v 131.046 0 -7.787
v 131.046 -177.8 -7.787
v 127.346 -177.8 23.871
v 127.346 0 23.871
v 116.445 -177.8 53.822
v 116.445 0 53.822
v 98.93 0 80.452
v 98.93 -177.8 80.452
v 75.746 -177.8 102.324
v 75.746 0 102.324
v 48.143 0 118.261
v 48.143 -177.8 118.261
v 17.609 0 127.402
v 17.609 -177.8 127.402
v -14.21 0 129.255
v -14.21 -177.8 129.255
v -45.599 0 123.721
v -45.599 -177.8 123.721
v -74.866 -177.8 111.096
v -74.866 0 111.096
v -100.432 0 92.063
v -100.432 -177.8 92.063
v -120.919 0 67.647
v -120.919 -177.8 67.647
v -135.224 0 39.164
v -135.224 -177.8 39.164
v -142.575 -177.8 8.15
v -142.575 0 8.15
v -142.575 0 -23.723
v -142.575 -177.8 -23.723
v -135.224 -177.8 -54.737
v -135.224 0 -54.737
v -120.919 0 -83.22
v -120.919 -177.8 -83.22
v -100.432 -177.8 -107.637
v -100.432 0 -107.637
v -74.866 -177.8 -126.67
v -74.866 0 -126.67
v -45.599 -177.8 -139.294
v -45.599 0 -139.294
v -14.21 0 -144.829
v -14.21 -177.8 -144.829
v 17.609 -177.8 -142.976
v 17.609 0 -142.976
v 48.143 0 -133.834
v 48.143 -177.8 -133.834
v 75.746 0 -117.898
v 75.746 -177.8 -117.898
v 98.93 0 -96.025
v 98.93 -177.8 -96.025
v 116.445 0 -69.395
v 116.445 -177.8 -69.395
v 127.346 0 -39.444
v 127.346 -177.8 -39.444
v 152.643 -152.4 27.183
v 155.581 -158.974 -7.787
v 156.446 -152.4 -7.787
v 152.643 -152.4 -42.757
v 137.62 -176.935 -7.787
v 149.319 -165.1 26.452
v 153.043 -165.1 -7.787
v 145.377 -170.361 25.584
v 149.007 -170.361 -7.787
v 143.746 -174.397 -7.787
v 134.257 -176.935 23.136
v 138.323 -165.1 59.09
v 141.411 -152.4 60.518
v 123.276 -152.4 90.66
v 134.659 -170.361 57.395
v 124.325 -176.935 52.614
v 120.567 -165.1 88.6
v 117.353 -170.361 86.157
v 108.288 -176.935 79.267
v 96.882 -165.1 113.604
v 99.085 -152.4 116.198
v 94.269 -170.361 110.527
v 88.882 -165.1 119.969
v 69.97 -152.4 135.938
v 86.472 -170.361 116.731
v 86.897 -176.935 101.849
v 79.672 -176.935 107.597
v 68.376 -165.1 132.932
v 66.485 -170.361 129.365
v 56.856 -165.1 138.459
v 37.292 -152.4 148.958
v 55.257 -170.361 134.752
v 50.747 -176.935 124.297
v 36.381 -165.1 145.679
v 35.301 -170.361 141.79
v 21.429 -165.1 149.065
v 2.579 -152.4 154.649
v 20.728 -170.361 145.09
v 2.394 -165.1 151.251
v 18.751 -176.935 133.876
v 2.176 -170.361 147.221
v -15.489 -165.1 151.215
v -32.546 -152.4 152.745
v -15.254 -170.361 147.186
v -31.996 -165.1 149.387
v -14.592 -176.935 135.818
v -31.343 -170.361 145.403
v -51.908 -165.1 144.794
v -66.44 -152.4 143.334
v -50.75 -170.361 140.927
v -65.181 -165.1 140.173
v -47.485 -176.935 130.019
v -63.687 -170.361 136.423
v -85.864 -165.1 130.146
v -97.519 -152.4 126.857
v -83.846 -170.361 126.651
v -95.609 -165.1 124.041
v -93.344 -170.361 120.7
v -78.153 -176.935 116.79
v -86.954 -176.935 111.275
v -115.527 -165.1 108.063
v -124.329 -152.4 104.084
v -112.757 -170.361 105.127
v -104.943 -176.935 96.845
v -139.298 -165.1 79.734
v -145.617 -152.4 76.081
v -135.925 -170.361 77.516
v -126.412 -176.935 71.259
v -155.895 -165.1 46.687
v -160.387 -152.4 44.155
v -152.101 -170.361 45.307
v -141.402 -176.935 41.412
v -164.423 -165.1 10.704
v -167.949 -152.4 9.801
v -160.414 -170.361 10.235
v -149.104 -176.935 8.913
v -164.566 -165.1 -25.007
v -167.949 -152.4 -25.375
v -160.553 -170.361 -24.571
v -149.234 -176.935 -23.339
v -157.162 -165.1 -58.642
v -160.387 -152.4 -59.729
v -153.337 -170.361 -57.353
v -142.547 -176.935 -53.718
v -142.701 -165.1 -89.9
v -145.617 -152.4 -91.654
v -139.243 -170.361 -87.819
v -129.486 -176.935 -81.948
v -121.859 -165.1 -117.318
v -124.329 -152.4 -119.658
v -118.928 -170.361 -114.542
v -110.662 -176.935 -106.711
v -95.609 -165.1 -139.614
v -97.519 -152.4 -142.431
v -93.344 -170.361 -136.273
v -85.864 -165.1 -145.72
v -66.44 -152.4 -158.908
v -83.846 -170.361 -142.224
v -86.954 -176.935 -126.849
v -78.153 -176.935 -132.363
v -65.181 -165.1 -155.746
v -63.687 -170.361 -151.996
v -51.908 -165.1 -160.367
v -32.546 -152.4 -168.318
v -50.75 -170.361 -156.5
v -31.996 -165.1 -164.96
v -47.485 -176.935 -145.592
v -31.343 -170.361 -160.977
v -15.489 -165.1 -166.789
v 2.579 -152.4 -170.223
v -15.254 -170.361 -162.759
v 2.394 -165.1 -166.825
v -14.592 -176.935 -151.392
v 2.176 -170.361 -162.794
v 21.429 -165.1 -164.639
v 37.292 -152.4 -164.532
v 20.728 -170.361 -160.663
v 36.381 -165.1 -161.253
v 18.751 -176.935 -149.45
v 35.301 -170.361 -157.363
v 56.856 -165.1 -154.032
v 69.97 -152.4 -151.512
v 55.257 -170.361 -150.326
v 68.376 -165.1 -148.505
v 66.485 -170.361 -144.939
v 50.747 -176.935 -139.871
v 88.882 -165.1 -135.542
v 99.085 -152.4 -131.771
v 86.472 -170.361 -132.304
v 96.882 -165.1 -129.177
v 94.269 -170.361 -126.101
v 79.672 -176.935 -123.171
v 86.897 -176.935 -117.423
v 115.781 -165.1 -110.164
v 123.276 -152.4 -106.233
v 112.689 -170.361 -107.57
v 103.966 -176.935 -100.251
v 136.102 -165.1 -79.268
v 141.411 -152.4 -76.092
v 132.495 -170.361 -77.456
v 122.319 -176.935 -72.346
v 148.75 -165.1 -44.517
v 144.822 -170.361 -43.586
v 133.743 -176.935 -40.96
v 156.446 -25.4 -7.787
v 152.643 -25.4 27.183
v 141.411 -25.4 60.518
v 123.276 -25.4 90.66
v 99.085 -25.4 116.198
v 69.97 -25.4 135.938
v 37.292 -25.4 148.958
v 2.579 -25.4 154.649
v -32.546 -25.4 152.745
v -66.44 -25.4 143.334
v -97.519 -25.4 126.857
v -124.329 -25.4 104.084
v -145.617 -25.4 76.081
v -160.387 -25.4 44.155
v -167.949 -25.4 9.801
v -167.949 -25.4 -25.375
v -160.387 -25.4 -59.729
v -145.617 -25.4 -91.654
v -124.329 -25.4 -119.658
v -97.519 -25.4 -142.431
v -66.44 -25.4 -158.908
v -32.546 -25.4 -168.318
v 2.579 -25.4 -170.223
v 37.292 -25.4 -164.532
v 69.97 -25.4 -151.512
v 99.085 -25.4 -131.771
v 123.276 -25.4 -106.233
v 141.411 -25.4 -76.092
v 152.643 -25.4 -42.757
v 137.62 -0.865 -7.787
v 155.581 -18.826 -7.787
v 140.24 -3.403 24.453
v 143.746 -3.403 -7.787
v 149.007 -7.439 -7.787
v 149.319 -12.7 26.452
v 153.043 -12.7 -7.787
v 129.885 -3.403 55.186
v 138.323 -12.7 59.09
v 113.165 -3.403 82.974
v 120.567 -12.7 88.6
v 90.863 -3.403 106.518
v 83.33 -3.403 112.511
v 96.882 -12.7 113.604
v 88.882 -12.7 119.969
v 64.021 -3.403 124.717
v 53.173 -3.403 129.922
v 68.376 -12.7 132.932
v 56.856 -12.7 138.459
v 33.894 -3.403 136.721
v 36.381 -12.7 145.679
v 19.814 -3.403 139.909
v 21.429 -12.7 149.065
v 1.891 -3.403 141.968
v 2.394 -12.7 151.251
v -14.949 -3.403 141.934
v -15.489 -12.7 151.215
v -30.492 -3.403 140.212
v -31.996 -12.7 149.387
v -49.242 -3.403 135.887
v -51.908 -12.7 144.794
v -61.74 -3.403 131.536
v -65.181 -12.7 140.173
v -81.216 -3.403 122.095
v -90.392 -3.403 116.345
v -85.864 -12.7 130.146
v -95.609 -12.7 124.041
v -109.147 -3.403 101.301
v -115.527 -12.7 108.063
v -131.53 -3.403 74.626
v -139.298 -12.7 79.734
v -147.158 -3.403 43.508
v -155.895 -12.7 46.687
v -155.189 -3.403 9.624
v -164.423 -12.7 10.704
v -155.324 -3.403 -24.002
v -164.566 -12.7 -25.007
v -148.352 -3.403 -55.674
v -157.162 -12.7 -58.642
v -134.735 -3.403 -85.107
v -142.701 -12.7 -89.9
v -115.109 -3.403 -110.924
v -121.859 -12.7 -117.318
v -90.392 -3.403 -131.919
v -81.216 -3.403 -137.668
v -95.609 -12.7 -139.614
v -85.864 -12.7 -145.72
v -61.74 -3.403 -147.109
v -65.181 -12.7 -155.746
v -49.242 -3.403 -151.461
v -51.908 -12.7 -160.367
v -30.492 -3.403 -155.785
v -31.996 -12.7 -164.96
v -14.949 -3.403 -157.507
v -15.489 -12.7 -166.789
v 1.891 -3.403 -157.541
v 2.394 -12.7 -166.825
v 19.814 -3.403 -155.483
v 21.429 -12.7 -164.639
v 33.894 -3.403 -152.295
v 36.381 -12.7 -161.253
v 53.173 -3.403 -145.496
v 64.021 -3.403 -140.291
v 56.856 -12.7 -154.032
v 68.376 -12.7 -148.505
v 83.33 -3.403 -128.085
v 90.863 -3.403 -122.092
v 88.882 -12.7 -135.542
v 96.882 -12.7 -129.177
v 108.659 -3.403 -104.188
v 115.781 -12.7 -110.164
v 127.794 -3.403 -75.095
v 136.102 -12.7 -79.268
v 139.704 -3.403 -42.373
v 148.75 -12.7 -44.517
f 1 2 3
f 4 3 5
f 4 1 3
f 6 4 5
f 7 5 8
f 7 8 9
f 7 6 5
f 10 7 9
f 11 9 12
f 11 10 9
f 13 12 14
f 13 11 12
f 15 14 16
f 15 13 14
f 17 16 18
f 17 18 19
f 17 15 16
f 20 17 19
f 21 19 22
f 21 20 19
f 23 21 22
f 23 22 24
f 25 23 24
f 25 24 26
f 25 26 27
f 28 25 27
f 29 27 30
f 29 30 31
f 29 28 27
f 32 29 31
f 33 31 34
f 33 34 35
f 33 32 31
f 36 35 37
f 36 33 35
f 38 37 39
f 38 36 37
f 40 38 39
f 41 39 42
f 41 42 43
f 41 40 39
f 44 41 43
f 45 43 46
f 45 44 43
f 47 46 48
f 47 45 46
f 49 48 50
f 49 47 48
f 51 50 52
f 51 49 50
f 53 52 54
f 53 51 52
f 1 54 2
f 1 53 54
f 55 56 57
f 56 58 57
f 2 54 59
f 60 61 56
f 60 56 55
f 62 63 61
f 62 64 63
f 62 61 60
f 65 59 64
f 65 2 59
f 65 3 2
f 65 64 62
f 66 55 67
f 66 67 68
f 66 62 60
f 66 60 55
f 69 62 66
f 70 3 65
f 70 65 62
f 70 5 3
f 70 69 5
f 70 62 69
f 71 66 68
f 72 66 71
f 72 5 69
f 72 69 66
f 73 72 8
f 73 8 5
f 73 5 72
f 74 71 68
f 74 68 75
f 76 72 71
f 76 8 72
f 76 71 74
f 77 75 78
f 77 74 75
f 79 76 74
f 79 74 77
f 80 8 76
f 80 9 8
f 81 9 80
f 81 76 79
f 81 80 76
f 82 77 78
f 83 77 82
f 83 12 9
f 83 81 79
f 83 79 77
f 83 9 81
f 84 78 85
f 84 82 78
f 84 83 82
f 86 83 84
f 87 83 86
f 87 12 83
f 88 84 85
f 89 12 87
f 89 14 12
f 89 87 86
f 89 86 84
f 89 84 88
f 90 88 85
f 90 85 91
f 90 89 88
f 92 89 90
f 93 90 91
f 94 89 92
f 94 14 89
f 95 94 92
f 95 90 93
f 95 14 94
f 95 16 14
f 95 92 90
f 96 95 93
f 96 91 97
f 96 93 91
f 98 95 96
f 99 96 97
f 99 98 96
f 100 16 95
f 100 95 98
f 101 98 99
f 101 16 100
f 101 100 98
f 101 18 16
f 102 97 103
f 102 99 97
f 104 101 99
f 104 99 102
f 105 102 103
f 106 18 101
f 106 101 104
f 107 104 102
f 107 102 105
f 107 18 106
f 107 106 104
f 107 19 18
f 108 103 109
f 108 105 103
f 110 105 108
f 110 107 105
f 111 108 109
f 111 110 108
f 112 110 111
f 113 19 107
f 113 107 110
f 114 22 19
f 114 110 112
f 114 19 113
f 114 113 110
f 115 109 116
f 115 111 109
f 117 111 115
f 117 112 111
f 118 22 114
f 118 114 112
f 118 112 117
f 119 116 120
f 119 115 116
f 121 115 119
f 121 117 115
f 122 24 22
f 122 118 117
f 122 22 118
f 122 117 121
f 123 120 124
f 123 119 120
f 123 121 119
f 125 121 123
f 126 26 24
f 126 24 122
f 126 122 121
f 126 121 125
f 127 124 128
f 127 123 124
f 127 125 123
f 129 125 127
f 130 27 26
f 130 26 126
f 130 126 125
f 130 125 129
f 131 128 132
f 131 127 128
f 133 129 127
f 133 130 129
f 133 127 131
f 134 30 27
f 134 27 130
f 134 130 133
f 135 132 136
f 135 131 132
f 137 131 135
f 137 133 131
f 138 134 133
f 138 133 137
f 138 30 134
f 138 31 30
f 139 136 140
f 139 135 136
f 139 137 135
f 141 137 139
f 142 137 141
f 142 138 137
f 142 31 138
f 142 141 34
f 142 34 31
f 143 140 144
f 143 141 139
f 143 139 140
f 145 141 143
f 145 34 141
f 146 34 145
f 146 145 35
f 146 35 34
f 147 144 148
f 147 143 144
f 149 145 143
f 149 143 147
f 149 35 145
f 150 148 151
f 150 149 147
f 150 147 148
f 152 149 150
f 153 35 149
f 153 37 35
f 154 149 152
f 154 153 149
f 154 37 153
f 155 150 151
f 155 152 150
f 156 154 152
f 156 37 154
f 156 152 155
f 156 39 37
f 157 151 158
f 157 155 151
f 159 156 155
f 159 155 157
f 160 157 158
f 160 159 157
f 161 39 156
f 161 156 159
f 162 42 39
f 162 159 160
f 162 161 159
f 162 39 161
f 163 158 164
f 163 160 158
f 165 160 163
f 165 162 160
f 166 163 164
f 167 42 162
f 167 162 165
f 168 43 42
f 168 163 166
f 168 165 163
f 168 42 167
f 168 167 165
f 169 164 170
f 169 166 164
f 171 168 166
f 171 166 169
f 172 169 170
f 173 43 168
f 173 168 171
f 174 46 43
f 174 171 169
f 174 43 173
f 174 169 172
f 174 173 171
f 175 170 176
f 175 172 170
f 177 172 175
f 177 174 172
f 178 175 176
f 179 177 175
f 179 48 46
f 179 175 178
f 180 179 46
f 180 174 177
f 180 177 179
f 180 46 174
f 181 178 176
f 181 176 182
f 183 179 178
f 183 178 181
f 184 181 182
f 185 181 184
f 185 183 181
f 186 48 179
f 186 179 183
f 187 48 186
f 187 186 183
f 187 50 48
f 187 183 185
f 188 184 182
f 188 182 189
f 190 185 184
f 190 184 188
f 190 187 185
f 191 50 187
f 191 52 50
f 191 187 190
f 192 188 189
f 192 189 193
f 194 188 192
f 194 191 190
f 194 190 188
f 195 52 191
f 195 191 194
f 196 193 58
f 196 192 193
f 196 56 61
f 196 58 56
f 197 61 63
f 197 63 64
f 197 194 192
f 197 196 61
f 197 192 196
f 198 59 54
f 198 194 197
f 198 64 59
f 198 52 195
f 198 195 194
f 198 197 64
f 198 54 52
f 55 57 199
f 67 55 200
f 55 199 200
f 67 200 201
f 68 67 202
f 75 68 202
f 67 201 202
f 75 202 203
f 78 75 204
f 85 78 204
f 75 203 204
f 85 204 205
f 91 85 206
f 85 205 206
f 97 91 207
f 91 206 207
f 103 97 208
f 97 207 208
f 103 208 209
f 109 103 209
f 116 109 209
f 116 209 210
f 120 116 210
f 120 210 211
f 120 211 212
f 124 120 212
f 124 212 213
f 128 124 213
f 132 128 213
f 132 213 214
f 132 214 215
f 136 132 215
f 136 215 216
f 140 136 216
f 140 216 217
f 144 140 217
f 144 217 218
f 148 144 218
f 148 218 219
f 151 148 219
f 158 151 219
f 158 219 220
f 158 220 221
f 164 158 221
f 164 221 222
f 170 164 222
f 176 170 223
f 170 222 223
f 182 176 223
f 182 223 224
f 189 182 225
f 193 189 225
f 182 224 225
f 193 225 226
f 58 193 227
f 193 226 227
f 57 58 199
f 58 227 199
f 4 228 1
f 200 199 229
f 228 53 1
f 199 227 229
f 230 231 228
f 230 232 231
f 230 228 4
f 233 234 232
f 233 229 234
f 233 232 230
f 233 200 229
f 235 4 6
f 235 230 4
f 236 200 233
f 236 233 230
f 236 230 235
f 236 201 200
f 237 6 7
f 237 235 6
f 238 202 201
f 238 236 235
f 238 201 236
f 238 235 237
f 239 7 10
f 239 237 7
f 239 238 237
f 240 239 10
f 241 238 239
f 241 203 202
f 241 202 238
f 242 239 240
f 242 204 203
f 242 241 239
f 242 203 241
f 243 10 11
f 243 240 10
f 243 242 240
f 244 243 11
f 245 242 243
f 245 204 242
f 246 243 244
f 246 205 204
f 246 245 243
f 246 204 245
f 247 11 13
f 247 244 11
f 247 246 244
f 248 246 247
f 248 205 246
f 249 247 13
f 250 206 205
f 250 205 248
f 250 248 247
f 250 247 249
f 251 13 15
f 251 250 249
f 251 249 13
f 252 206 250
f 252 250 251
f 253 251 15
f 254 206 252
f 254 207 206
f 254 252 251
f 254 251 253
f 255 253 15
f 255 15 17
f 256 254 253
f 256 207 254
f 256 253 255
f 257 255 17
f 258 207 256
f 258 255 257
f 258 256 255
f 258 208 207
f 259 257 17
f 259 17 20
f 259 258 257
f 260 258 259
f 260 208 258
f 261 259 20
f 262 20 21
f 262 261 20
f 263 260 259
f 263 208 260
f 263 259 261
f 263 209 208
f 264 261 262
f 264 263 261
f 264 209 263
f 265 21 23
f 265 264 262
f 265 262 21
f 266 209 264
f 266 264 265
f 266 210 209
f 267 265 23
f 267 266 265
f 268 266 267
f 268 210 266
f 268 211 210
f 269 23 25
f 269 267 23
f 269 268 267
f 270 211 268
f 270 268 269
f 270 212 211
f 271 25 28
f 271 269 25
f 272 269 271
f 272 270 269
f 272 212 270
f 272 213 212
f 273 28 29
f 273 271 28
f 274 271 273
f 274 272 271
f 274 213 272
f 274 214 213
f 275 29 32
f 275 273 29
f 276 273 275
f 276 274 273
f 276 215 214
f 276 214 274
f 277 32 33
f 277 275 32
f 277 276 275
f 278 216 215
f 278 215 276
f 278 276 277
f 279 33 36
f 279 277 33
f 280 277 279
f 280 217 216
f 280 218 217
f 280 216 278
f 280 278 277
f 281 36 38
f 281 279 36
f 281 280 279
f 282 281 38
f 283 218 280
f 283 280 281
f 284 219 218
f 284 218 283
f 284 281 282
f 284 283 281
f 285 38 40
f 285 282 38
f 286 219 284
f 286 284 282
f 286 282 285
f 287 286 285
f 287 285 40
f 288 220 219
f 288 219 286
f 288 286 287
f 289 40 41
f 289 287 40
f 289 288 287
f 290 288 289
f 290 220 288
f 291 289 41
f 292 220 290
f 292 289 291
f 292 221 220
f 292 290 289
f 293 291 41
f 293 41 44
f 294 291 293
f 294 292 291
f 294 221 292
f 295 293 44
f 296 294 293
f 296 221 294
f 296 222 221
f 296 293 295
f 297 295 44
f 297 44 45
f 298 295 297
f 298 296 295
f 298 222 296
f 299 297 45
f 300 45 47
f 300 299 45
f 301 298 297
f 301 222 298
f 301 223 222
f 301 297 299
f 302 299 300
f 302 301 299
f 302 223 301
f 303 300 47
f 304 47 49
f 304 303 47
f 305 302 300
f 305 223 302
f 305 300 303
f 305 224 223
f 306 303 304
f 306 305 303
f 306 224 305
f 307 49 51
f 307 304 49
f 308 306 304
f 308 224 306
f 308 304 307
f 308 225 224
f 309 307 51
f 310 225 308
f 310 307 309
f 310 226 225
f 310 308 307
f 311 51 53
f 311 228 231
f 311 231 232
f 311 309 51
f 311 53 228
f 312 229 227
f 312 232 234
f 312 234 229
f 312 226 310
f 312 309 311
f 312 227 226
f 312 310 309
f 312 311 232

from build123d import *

# Parameters (mm, degrees)
F0_R     = 137.2744361776
F1_DEPTH = 177.8
F2_T     = 25.4


# Not quite as in the source:
# - a fillet or chamfer that OpenCascade refuses, or shapes differently, is made with other operations: its cross-section is extruded or revolved along the edge and cut away or added


with BuildPart() as f1:
    # F0 (on Front) → F1 (new body)
    with BuildSketch(Plane.XZ):
        with Locations((-6.2283538282, -7.7867358923)):
            Circle(F0_R)
    extrude(amount=F1_DEPTH)

    # F2
    f2_openings = [f1.faces().sort_by_distance(p)[0] for p in [
        (-6.228354, -177.8, -7.786736),
        (-6.228354, 0, -7.786736),
    ]]
    offset(amount=F2_T, openings=f2_openings)

    # F3: fillet of radius 25.4 on 2 edges, made by hand

    # F3_s1 → F3_t2 (revolve, cut)
    with BuildSketch(Plane.XY.offset(-7.7867358923)):
        with BuildLine():
            ThreePointArc((131.0460823494, 0), (149.0065945915, -7.4394877579), (156.4460823494, -25.4))
            Line((156.4460823494, -25.4), (156.4460823494, 0))
            Line((156.4460823494, 0), (131.0460823494, 0))
        make_face()
    revolve(axis=Axis((-6.2283538282, 0, -7.7867358923), (0, -1, 0)), mode=Mode.SUBTRACT)

    # F3_s3 → F3_t4 (revolve, cut)
    with BuildSketch(Plane.XY.offset(-7.7867358923)):
        with BuildLine():
            ThreePointArc((156.4460823494, -152.4), (149.0065945915, -170.3605122421), (131.0460823494, -177.8))
            Line((131.0460823494, -177.8), (156.4460823494, -177.8))
            Line((156.4460823494, -177.8), (156.4460823494, -152.4))
        make_face()
    revolve(axis=Axis((-6.2283538282, -177.8, -7.7867358923), (0, -1, 0)), mode=Mode.SUBTRACT)


solid = f1.part
